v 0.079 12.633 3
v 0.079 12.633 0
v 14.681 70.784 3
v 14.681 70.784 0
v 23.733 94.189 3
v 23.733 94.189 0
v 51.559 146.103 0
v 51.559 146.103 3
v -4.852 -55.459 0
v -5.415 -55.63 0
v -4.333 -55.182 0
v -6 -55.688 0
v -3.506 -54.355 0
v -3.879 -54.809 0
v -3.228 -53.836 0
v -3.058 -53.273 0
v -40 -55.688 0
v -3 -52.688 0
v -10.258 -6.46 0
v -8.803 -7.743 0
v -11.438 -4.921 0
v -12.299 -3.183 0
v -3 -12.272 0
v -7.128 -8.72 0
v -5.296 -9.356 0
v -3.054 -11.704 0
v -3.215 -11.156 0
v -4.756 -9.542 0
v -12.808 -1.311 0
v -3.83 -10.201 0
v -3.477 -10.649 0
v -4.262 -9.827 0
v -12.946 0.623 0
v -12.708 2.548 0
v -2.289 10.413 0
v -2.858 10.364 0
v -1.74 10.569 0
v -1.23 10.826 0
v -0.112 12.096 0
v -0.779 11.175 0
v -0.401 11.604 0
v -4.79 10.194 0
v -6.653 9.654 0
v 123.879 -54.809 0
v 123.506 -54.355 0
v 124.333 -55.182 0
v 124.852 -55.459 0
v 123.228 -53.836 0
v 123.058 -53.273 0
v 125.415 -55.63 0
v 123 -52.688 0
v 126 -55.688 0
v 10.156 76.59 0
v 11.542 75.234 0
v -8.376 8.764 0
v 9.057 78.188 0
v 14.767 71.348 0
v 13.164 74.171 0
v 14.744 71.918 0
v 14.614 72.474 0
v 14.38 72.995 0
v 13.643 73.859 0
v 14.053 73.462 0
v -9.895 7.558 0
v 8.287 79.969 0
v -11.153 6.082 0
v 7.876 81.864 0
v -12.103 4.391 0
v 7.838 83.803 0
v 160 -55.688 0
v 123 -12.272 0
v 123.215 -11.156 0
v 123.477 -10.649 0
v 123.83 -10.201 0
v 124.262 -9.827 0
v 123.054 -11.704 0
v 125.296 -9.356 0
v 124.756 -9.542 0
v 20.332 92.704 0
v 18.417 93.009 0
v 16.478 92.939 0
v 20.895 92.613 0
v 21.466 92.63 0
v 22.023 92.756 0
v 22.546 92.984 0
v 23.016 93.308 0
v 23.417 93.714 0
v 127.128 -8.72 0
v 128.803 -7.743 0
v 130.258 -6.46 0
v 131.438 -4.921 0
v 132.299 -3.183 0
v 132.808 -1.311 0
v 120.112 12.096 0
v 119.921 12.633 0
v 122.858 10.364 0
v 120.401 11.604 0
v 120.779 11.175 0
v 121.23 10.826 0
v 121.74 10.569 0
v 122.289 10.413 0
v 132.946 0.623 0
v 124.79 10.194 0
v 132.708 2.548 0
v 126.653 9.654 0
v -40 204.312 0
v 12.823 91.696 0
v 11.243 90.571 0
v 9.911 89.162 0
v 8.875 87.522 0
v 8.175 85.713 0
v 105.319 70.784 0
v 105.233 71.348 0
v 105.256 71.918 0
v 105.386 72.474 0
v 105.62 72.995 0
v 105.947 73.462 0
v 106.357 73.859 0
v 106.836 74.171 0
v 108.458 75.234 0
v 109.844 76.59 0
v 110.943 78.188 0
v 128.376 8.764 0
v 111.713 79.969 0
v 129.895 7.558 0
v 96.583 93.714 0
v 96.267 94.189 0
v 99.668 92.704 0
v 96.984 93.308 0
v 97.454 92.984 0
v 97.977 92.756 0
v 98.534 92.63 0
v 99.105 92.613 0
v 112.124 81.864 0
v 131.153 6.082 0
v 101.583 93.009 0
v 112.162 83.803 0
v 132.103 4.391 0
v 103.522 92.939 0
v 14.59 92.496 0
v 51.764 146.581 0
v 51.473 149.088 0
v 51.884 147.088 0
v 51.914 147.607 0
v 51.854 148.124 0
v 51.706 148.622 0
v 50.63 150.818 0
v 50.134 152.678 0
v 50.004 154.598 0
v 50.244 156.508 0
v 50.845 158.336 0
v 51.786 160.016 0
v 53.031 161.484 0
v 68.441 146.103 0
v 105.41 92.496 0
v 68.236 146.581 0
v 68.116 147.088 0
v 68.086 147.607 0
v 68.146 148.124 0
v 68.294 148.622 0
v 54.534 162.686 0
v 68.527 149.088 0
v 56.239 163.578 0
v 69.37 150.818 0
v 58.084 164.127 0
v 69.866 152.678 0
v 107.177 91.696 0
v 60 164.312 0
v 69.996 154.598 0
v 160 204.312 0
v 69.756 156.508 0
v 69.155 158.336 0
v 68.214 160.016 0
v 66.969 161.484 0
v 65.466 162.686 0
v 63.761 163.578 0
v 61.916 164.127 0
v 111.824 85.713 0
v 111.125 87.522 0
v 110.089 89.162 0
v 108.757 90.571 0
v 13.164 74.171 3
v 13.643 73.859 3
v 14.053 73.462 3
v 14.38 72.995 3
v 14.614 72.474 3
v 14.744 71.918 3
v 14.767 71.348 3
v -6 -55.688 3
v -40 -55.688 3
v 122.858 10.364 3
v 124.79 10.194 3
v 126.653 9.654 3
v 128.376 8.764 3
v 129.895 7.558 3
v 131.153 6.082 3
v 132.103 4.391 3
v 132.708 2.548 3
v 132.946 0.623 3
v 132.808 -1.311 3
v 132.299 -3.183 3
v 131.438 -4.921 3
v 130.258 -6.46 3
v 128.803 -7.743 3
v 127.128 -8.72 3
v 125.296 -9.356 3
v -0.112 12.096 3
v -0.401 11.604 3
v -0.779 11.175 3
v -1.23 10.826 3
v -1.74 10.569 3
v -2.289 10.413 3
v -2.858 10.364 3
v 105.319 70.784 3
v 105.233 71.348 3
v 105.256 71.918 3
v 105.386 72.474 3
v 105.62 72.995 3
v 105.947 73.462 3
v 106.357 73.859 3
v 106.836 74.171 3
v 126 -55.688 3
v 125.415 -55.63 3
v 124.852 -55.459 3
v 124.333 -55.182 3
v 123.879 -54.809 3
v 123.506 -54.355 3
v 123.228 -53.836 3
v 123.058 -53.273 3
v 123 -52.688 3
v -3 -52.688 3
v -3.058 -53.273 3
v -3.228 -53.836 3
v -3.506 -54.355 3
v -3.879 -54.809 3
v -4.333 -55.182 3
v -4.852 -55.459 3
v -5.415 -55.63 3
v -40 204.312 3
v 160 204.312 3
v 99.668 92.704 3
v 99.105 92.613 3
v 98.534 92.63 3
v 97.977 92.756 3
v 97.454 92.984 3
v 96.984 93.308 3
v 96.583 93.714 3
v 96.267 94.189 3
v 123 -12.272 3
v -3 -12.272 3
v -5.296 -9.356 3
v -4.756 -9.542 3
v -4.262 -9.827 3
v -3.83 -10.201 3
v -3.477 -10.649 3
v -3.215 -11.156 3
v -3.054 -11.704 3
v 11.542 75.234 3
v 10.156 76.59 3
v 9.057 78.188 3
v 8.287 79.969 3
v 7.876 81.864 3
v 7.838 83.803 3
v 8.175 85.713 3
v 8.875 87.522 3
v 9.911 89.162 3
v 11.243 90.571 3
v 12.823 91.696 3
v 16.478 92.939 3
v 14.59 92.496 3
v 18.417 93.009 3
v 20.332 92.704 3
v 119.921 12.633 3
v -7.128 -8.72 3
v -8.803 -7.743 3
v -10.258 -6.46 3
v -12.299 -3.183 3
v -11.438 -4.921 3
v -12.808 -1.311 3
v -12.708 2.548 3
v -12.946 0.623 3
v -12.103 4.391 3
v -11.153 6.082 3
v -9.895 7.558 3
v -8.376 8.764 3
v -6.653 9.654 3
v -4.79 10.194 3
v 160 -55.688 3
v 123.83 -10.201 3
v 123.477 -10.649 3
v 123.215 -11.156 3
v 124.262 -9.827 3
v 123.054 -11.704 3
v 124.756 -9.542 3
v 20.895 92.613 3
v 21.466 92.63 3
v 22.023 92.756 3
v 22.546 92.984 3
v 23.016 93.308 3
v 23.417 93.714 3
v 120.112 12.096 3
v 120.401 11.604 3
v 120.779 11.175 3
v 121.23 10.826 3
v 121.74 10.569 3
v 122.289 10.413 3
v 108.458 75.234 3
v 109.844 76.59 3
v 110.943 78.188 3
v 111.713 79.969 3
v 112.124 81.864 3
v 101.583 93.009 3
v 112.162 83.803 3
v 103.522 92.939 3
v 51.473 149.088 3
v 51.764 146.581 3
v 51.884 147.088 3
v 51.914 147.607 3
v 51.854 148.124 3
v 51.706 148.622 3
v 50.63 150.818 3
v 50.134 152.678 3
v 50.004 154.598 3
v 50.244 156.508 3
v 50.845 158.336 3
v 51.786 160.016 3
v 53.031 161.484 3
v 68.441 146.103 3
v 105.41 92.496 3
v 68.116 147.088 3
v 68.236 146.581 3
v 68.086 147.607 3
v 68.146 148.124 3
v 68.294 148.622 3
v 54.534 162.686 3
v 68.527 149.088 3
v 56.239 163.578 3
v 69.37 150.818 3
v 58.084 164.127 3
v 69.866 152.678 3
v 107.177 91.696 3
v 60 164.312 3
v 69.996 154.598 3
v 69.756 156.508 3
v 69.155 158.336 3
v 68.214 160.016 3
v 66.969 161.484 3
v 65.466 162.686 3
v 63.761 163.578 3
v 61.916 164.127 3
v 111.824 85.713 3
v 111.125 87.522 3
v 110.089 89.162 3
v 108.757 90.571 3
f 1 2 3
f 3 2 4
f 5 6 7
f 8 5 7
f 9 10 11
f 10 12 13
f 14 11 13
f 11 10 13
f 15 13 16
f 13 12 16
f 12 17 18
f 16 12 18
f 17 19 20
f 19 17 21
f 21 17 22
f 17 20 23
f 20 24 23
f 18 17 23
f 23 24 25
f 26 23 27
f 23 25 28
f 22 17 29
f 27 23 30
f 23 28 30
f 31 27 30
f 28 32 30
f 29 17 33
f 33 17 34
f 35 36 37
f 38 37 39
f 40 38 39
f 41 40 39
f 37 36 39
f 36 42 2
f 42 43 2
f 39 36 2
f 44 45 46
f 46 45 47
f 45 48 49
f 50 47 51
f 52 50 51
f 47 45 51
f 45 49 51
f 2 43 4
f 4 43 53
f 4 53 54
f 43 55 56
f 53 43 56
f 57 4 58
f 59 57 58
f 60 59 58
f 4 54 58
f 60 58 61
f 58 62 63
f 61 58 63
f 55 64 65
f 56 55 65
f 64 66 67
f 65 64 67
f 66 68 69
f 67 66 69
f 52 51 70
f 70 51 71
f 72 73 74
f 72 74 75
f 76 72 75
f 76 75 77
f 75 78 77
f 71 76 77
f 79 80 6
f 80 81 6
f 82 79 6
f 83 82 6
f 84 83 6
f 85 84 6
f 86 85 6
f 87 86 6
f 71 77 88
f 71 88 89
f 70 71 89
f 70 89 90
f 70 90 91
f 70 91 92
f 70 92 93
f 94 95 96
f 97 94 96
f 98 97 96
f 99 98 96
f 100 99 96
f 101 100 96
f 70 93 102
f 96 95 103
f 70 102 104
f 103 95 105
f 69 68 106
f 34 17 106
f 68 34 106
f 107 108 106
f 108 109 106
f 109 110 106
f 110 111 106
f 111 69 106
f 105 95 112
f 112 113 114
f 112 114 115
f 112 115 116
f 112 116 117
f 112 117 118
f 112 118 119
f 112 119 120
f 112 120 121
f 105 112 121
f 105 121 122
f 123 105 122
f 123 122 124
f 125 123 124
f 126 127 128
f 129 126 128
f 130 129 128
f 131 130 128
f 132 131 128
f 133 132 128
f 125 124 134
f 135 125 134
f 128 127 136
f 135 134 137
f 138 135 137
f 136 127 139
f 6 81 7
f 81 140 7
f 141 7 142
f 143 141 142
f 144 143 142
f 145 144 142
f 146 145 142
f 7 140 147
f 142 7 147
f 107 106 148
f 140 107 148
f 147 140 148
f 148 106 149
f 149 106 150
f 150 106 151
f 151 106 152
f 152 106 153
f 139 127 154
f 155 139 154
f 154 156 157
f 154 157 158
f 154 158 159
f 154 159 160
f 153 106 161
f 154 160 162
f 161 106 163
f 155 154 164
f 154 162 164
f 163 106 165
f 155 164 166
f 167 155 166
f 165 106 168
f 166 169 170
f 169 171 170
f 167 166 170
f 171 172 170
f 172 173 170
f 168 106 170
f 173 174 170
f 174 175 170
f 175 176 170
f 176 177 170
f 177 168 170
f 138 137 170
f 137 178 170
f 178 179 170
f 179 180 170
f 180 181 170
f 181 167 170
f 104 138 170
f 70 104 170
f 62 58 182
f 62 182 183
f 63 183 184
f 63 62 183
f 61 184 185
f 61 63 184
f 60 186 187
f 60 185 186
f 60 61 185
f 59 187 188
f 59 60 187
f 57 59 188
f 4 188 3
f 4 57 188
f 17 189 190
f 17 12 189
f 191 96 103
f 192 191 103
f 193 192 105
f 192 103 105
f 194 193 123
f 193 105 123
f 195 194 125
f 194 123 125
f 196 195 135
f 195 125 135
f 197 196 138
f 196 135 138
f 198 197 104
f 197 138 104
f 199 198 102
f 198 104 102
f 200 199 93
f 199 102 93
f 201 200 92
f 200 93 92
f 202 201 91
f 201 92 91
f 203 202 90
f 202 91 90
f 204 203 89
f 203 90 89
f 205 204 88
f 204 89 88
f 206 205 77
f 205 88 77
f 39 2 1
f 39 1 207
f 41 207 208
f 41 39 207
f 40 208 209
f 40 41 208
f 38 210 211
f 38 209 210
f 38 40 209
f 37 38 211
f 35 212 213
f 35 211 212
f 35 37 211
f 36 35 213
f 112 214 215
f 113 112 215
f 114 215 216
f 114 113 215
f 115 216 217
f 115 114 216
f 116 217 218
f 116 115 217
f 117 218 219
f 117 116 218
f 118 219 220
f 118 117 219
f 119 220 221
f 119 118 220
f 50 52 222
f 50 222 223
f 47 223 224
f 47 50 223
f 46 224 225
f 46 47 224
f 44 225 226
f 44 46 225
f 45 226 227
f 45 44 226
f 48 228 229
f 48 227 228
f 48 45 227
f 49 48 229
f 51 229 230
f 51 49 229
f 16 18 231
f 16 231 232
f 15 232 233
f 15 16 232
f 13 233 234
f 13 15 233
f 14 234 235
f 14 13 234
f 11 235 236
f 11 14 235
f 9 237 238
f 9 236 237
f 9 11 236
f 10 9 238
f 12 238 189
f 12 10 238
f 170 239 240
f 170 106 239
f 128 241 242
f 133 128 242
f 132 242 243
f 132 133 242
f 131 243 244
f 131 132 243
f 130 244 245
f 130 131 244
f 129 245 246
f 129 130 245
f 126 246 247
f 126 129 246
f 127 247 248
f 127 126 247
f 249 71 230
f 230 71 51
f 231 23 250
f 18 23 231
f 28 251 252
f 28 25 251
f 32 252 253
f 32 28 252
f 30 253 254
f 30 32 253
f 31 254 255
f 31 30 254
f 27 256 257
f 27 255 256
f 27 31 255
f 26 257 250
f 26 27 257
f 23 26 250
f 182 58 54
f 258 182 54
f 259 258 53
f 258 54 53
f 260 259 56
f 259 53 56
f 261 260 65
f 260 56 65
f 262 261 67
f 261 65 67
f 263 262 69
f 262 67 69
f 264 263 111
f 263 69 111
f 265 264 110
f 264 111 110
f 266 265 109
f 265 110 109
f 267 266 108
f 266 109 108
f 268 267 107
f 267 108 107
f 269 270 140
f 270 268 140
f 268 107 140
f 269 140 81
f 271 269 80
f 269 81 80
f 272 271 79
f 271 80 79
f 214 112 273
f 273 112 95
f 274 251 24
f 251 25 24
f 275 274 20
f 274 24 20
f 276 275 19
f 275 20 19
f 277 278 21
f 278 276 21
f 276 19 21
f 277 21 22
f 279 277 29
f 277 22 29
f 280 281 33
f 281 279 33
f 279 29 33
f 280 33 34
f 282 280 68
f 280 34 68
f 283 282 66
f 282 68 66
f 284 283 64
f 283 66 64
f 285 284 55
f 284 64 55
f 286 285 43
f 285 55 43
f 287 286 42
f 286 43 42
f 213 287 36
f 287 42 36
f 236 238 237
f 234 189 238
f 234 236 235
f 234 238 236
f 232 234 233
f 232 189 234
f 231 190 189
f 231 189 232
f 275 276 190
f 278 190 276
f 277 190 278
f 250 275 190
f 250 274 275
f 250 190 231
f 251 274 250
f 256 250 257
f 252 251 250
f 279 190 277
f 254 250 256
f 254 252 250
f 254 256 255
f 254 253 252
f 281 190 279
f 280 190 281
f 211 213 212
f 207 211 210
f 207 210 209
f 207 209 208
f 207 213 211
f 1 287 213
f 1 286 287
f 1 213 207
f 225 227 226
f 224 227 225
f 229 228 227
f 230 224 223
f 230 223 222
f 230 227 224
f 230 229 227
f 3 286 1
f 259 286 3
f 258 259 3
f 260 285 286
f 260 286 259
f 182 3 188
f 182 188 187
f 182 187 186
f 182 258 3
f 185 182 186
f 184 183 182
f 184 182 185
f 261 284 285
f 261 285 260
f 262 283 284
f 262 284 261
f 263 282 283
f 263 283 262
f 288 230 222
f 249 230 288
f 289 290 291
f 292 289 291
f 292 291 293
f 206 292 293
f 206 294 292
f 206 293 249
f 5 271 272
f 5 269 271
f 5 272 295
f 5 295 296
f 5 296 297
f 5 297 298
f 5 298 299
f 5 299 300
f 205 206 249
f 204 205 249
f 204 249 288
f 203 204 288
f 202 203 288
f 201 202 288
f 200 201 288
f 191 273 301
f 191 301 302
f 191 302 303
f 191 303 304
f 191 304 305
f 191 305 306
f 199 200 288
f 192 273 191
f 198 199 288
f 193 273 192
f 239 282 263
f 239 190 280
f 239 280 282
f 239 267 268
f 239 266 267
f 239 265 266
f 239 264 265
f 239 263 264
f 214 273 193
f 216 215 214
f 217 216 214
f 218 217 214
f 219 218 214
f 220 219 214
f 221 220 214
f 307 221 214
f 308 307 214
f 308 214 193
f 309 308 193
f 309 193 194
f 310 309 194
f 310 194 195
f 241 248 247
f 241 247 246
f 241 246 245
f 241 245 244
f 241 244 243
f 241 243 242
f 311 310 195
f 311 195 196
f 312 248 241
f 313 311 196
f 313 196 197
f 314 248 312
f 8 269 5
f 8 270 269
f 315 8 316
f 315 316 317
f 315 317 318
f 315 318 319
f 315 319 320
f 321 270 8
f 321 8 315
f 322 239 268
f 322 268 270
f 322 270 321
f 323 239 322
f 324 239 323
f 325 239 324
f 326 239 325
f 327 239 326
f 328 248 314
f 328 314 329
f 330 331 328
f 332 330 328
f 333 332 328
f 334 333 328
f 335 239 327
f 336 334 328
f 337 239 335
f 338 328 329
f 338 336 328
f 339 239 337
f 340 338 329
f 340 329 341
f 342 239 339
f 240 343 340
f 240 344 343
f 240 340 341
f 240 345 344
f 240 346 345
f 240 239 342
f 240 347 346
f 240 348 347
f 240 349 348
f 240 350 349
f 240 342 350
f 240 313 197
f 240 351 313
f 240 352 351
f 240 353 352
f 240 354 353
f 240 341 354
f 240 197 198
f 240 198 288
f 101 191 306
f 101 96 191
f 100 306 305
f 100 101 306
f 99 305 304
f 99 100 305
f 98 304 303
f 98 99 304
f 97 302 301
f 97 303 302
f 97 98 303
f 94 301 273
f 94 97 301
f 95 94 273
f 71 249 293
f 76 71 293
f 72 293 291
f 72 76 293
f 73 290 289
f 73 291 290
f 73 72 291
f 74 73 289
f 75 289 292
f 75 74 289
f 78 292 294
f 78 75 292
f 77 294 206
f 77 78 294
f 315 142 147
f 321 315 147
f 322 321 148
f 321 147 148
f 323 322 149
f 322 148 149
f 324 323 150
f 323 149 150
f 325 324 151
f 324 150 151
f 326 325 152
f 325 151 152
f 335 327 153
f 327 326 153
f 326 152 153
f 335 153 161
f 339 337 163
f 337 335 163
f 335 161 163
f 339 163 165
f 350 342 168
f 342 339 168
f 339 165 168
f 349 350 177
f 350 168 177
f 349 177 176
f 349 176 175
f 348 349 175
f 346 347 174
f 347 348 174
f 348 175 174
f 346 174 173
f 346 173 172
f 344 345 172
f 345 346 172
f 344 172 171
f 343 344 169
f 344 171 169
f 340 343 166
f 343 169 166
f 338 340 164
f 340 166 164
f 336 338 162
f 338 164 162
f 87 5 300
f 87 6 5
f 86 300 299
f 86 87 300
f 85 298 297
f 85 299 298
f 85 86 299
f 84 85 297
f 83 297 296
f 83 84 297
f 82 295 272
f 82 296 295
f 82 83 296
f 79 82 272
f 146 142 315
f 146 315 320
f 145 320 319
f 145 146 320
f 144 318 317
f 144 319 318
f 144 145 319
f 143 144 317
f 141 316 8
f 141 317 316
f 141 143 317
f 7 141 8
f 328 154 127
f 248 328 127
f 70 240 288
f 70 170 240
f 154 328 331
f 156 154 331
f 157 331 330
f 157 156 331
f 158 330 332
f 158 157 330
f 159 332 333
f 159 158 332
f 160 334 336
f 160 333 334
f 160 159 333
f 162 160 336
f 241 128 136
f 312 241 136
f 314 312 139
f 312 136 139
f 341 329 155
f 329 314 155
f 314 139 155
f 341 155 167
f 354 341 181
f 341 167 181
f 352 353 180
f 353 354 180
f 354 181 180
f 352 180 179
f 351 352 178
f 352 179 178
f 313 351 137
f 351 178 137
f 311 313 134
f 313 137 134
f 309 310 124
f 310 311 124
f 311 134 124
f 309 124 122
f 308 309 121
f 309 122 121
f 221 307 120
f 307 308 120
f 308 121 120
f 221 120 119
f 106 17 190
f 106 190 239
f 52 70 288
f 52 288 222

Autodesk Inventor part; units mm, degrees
ref_plane "YZ Plane" through (0, 0, 0) normal (1, 0, 0) x (0, 1, 0)
ref_plane "XZ Plane" through (0, 0, 0) normal (0, 1, 0) x (-1, 0, 0)
ref_plane "XY Plane" through (0, 0, 0) normal (0, 0, 1) x (1, 0, 0)
ref_plane "Work Plane1" through (0, 0, 0) normal (0, 0, 1) x (1, 0, 0)
sketch "Sketch1" plane through (0, 0, 0) normal (0, 0, 1) x (1, 0, 0)
  line L0 (60, 154.3122) -> (60, -124.8582) construction
  line L1 (-40, -55.6878) -> (-40, 204.3122)
  line L2 (-40, 204.3122) -> (160, 204.3122)
  line L3 (160, 204.3122) -> (160, -55.6878)
  arc A0 (-2.8578, 10.3642) -> (-5.2959, -9.3561) centre (-2.949, 0.3646) ccw
  arc A1 (20.3319, 92.7038) -> (13.1645, 74.1711) centre (17.8081, 83.0275) ccw
  arc A2 (68.5267, 149.0877) -> (51.4733, 149.0877) centre (60, 154.3122) ccw
  arc A3 (106.8355, 74.1711) -> (99.6681, 92.7038) centre (102.1919, 83.0275) ccw
  arc A4 (125.2959, -9.3561) -> (122.8578, 10.3642) centre (122.949, 0.3646) ccw
  line L4 (-3, -12.2723) -> (-3, -52.6878)
  line L5 (0.0792, 12.6334) -> (14.681, 70.7835)
  line L6 (23.7332, 94.1894) -> (51.5594, 146.1031)
  line L7 (68.4406, 146.1031) -> (96.2668, 94.1894)
  line L8 (105.319, 70.7835) -> (119.9208, 12.6334)
  line L9 (123, -12.2723) -> (123, -52.6878)
  line L10 (160, -55.6878) -> (126, -55.6878)
  line L11 (-6, -55.6878) -> (-40, -55.6878)
  line L12 (-3, -0.4636) -> (-3, -80.75)
  line L13 (17.557, 82.2366) -> (-2.7968, 1.1803)
  line L14 (54.0507, 150.7511) -> (18.1545, 83.7816)
  line L15 (101.8455, 83.7816) -> (65.9493, 150.7511)
  line L16 (122.7968, 1.1803) -> (102.443, 82.2366)
  line L17 (123, -80.75) -> (123, -0.4636)
  arc A5 (-2.7968, 1.1803) -> (-3, -0.4636) centre (3.75, -0.4636) ccw
  arc A6 (18.1545, 83.7816) -> (17.557, 82.2366) centre (24.1037, 80.5927) ccw
  arc A7 (65.9493, 150.7511) -> (54.0507, 150.7511) centre (60, 147.5622) ccw
  arc A8 (102.443, 82.2366) -> (101.8455, 83.7816) centre (95.8963, 80.5927) ccw
  arc A9 (123, -0.4636) -> (122.7968, 1.1803) centre (116.25, -0.4636) ccw
  line L18 (60, 147.5622) -> (60, 430.3186) construction
  arc A10 (-6, -55.6878) -> (-3, -52.6878) centre (-6, -52.6878) ccw
  arc A11 (-3, -12.2723) -> (-5.2959, -9.3561) centre (-6, -12.2723) ccw
  arc A12 (-2.8578, 10.3642) -> (0.0792, 12.6334) centre (-2.8305, 13.3641) ccw
  arc A13 (14.681, 70.7835) -> (13.1645, 74.1711) centre (11.7714, 71.5142) ccw
  arc A14 (20.3319, 92.7038) -> (23.7332, 94.1894) centre (21.089, 95.6067) ccw
  arc A15 (51.5594, 146.1031) -> (51.4733, 149.0877) centre (48.9153, 147.5204) ccw
  arc A16 (68.5267, 149.0877) -> (68.4406, 146.1031) centre (71.0847, 147.5204) ccw
  arc A17 (96.2668, 94.1894) -> (99.6681, 92.7038) centre (98.911, 95.6067) ccw
  arc A18 (106.8355, 74.1711) -> (105.319, 70.7835) centre (108.2286, 71.5142) ccw
  arc A19 (119.9208, 12.6334) -> (122.8578, 10.3642) centre (122.8305, 13.3641) ccw
  arc A20 (125.2959, -9.3561) -> (123, -12.2723) centre (126, -12.2723) ccw
  arc A21 (123, -52.6878) -> (126, -55.6878) centre (126, -52.6878) ccw
  point P0 (0, 0)
  point P1 (-0.563, 10.0758)
  point P2 (-3, -9.6353)
  point P3 (22.4874, 91.8652)
  point P4 (15.3233, 73.3412)
  point P5 (67.5532, 147.7587)
  point P6 (52.4468, 147.7587)
  point P7 (104.6767, 73.3412)
  point P8 (97.5126, 91.8652)
  point P9 (123, -9.6353)
  point P10 (120.563, 10.0758)
  point P11 (97.5126, 91.8652)
  point P12 (123, -55.6878)
  point P13 (123, -55.6878)
  point P14 (-3, -55.6878)
  dimension "d0" = 200
  dimension "d1" = 100
  dimension "d2" = 260
  dimension "d3" = 50
  dimension "d4" = 10
  dimension "d5" = 10
  dimension "d6" = 10
  dimension "d7" = 10
  dimension "d8" = 10
  dimension "d9" = 3
extrude "Plate1" add sketch "Sketch1" along normal blind 3 contours L1 L2 L3 L10 A21 L9 A20 A4 A19 L8 A18 A3 A17 L7 A16 A2 A15 L6 A14 A1 A13 L5 A12 A0 A11 L4 A10 L11
equation "\"d1\" = 0.5 * d0"
equation "\"d5\" = d4"
equation "\"d6\" = d4"
equation "\"d7\" = d4"
equation "\"d8\" = d4"
equation "\"d10\" = Thickness"
equation "\"BendRadius\" = Thickness"
equation "\"BendReliefWidth\" = Thickness"
equation "\"BendReliefDepth\" = 0.5 * Thickness"
equation "\"CornerReliefSize\" = 4 * Thickness"
equation "\"MinimumRemnant\" = 2 * Thickness"
equation "\"TransitionRadius\" = BendRadius"
equation "\"JacobiRadiusSize\" = BendRadius"
equation "\"GapSize\" = Thickness"
equation "\"Thickness\" = 3"
properties part number "svejselære 1"
